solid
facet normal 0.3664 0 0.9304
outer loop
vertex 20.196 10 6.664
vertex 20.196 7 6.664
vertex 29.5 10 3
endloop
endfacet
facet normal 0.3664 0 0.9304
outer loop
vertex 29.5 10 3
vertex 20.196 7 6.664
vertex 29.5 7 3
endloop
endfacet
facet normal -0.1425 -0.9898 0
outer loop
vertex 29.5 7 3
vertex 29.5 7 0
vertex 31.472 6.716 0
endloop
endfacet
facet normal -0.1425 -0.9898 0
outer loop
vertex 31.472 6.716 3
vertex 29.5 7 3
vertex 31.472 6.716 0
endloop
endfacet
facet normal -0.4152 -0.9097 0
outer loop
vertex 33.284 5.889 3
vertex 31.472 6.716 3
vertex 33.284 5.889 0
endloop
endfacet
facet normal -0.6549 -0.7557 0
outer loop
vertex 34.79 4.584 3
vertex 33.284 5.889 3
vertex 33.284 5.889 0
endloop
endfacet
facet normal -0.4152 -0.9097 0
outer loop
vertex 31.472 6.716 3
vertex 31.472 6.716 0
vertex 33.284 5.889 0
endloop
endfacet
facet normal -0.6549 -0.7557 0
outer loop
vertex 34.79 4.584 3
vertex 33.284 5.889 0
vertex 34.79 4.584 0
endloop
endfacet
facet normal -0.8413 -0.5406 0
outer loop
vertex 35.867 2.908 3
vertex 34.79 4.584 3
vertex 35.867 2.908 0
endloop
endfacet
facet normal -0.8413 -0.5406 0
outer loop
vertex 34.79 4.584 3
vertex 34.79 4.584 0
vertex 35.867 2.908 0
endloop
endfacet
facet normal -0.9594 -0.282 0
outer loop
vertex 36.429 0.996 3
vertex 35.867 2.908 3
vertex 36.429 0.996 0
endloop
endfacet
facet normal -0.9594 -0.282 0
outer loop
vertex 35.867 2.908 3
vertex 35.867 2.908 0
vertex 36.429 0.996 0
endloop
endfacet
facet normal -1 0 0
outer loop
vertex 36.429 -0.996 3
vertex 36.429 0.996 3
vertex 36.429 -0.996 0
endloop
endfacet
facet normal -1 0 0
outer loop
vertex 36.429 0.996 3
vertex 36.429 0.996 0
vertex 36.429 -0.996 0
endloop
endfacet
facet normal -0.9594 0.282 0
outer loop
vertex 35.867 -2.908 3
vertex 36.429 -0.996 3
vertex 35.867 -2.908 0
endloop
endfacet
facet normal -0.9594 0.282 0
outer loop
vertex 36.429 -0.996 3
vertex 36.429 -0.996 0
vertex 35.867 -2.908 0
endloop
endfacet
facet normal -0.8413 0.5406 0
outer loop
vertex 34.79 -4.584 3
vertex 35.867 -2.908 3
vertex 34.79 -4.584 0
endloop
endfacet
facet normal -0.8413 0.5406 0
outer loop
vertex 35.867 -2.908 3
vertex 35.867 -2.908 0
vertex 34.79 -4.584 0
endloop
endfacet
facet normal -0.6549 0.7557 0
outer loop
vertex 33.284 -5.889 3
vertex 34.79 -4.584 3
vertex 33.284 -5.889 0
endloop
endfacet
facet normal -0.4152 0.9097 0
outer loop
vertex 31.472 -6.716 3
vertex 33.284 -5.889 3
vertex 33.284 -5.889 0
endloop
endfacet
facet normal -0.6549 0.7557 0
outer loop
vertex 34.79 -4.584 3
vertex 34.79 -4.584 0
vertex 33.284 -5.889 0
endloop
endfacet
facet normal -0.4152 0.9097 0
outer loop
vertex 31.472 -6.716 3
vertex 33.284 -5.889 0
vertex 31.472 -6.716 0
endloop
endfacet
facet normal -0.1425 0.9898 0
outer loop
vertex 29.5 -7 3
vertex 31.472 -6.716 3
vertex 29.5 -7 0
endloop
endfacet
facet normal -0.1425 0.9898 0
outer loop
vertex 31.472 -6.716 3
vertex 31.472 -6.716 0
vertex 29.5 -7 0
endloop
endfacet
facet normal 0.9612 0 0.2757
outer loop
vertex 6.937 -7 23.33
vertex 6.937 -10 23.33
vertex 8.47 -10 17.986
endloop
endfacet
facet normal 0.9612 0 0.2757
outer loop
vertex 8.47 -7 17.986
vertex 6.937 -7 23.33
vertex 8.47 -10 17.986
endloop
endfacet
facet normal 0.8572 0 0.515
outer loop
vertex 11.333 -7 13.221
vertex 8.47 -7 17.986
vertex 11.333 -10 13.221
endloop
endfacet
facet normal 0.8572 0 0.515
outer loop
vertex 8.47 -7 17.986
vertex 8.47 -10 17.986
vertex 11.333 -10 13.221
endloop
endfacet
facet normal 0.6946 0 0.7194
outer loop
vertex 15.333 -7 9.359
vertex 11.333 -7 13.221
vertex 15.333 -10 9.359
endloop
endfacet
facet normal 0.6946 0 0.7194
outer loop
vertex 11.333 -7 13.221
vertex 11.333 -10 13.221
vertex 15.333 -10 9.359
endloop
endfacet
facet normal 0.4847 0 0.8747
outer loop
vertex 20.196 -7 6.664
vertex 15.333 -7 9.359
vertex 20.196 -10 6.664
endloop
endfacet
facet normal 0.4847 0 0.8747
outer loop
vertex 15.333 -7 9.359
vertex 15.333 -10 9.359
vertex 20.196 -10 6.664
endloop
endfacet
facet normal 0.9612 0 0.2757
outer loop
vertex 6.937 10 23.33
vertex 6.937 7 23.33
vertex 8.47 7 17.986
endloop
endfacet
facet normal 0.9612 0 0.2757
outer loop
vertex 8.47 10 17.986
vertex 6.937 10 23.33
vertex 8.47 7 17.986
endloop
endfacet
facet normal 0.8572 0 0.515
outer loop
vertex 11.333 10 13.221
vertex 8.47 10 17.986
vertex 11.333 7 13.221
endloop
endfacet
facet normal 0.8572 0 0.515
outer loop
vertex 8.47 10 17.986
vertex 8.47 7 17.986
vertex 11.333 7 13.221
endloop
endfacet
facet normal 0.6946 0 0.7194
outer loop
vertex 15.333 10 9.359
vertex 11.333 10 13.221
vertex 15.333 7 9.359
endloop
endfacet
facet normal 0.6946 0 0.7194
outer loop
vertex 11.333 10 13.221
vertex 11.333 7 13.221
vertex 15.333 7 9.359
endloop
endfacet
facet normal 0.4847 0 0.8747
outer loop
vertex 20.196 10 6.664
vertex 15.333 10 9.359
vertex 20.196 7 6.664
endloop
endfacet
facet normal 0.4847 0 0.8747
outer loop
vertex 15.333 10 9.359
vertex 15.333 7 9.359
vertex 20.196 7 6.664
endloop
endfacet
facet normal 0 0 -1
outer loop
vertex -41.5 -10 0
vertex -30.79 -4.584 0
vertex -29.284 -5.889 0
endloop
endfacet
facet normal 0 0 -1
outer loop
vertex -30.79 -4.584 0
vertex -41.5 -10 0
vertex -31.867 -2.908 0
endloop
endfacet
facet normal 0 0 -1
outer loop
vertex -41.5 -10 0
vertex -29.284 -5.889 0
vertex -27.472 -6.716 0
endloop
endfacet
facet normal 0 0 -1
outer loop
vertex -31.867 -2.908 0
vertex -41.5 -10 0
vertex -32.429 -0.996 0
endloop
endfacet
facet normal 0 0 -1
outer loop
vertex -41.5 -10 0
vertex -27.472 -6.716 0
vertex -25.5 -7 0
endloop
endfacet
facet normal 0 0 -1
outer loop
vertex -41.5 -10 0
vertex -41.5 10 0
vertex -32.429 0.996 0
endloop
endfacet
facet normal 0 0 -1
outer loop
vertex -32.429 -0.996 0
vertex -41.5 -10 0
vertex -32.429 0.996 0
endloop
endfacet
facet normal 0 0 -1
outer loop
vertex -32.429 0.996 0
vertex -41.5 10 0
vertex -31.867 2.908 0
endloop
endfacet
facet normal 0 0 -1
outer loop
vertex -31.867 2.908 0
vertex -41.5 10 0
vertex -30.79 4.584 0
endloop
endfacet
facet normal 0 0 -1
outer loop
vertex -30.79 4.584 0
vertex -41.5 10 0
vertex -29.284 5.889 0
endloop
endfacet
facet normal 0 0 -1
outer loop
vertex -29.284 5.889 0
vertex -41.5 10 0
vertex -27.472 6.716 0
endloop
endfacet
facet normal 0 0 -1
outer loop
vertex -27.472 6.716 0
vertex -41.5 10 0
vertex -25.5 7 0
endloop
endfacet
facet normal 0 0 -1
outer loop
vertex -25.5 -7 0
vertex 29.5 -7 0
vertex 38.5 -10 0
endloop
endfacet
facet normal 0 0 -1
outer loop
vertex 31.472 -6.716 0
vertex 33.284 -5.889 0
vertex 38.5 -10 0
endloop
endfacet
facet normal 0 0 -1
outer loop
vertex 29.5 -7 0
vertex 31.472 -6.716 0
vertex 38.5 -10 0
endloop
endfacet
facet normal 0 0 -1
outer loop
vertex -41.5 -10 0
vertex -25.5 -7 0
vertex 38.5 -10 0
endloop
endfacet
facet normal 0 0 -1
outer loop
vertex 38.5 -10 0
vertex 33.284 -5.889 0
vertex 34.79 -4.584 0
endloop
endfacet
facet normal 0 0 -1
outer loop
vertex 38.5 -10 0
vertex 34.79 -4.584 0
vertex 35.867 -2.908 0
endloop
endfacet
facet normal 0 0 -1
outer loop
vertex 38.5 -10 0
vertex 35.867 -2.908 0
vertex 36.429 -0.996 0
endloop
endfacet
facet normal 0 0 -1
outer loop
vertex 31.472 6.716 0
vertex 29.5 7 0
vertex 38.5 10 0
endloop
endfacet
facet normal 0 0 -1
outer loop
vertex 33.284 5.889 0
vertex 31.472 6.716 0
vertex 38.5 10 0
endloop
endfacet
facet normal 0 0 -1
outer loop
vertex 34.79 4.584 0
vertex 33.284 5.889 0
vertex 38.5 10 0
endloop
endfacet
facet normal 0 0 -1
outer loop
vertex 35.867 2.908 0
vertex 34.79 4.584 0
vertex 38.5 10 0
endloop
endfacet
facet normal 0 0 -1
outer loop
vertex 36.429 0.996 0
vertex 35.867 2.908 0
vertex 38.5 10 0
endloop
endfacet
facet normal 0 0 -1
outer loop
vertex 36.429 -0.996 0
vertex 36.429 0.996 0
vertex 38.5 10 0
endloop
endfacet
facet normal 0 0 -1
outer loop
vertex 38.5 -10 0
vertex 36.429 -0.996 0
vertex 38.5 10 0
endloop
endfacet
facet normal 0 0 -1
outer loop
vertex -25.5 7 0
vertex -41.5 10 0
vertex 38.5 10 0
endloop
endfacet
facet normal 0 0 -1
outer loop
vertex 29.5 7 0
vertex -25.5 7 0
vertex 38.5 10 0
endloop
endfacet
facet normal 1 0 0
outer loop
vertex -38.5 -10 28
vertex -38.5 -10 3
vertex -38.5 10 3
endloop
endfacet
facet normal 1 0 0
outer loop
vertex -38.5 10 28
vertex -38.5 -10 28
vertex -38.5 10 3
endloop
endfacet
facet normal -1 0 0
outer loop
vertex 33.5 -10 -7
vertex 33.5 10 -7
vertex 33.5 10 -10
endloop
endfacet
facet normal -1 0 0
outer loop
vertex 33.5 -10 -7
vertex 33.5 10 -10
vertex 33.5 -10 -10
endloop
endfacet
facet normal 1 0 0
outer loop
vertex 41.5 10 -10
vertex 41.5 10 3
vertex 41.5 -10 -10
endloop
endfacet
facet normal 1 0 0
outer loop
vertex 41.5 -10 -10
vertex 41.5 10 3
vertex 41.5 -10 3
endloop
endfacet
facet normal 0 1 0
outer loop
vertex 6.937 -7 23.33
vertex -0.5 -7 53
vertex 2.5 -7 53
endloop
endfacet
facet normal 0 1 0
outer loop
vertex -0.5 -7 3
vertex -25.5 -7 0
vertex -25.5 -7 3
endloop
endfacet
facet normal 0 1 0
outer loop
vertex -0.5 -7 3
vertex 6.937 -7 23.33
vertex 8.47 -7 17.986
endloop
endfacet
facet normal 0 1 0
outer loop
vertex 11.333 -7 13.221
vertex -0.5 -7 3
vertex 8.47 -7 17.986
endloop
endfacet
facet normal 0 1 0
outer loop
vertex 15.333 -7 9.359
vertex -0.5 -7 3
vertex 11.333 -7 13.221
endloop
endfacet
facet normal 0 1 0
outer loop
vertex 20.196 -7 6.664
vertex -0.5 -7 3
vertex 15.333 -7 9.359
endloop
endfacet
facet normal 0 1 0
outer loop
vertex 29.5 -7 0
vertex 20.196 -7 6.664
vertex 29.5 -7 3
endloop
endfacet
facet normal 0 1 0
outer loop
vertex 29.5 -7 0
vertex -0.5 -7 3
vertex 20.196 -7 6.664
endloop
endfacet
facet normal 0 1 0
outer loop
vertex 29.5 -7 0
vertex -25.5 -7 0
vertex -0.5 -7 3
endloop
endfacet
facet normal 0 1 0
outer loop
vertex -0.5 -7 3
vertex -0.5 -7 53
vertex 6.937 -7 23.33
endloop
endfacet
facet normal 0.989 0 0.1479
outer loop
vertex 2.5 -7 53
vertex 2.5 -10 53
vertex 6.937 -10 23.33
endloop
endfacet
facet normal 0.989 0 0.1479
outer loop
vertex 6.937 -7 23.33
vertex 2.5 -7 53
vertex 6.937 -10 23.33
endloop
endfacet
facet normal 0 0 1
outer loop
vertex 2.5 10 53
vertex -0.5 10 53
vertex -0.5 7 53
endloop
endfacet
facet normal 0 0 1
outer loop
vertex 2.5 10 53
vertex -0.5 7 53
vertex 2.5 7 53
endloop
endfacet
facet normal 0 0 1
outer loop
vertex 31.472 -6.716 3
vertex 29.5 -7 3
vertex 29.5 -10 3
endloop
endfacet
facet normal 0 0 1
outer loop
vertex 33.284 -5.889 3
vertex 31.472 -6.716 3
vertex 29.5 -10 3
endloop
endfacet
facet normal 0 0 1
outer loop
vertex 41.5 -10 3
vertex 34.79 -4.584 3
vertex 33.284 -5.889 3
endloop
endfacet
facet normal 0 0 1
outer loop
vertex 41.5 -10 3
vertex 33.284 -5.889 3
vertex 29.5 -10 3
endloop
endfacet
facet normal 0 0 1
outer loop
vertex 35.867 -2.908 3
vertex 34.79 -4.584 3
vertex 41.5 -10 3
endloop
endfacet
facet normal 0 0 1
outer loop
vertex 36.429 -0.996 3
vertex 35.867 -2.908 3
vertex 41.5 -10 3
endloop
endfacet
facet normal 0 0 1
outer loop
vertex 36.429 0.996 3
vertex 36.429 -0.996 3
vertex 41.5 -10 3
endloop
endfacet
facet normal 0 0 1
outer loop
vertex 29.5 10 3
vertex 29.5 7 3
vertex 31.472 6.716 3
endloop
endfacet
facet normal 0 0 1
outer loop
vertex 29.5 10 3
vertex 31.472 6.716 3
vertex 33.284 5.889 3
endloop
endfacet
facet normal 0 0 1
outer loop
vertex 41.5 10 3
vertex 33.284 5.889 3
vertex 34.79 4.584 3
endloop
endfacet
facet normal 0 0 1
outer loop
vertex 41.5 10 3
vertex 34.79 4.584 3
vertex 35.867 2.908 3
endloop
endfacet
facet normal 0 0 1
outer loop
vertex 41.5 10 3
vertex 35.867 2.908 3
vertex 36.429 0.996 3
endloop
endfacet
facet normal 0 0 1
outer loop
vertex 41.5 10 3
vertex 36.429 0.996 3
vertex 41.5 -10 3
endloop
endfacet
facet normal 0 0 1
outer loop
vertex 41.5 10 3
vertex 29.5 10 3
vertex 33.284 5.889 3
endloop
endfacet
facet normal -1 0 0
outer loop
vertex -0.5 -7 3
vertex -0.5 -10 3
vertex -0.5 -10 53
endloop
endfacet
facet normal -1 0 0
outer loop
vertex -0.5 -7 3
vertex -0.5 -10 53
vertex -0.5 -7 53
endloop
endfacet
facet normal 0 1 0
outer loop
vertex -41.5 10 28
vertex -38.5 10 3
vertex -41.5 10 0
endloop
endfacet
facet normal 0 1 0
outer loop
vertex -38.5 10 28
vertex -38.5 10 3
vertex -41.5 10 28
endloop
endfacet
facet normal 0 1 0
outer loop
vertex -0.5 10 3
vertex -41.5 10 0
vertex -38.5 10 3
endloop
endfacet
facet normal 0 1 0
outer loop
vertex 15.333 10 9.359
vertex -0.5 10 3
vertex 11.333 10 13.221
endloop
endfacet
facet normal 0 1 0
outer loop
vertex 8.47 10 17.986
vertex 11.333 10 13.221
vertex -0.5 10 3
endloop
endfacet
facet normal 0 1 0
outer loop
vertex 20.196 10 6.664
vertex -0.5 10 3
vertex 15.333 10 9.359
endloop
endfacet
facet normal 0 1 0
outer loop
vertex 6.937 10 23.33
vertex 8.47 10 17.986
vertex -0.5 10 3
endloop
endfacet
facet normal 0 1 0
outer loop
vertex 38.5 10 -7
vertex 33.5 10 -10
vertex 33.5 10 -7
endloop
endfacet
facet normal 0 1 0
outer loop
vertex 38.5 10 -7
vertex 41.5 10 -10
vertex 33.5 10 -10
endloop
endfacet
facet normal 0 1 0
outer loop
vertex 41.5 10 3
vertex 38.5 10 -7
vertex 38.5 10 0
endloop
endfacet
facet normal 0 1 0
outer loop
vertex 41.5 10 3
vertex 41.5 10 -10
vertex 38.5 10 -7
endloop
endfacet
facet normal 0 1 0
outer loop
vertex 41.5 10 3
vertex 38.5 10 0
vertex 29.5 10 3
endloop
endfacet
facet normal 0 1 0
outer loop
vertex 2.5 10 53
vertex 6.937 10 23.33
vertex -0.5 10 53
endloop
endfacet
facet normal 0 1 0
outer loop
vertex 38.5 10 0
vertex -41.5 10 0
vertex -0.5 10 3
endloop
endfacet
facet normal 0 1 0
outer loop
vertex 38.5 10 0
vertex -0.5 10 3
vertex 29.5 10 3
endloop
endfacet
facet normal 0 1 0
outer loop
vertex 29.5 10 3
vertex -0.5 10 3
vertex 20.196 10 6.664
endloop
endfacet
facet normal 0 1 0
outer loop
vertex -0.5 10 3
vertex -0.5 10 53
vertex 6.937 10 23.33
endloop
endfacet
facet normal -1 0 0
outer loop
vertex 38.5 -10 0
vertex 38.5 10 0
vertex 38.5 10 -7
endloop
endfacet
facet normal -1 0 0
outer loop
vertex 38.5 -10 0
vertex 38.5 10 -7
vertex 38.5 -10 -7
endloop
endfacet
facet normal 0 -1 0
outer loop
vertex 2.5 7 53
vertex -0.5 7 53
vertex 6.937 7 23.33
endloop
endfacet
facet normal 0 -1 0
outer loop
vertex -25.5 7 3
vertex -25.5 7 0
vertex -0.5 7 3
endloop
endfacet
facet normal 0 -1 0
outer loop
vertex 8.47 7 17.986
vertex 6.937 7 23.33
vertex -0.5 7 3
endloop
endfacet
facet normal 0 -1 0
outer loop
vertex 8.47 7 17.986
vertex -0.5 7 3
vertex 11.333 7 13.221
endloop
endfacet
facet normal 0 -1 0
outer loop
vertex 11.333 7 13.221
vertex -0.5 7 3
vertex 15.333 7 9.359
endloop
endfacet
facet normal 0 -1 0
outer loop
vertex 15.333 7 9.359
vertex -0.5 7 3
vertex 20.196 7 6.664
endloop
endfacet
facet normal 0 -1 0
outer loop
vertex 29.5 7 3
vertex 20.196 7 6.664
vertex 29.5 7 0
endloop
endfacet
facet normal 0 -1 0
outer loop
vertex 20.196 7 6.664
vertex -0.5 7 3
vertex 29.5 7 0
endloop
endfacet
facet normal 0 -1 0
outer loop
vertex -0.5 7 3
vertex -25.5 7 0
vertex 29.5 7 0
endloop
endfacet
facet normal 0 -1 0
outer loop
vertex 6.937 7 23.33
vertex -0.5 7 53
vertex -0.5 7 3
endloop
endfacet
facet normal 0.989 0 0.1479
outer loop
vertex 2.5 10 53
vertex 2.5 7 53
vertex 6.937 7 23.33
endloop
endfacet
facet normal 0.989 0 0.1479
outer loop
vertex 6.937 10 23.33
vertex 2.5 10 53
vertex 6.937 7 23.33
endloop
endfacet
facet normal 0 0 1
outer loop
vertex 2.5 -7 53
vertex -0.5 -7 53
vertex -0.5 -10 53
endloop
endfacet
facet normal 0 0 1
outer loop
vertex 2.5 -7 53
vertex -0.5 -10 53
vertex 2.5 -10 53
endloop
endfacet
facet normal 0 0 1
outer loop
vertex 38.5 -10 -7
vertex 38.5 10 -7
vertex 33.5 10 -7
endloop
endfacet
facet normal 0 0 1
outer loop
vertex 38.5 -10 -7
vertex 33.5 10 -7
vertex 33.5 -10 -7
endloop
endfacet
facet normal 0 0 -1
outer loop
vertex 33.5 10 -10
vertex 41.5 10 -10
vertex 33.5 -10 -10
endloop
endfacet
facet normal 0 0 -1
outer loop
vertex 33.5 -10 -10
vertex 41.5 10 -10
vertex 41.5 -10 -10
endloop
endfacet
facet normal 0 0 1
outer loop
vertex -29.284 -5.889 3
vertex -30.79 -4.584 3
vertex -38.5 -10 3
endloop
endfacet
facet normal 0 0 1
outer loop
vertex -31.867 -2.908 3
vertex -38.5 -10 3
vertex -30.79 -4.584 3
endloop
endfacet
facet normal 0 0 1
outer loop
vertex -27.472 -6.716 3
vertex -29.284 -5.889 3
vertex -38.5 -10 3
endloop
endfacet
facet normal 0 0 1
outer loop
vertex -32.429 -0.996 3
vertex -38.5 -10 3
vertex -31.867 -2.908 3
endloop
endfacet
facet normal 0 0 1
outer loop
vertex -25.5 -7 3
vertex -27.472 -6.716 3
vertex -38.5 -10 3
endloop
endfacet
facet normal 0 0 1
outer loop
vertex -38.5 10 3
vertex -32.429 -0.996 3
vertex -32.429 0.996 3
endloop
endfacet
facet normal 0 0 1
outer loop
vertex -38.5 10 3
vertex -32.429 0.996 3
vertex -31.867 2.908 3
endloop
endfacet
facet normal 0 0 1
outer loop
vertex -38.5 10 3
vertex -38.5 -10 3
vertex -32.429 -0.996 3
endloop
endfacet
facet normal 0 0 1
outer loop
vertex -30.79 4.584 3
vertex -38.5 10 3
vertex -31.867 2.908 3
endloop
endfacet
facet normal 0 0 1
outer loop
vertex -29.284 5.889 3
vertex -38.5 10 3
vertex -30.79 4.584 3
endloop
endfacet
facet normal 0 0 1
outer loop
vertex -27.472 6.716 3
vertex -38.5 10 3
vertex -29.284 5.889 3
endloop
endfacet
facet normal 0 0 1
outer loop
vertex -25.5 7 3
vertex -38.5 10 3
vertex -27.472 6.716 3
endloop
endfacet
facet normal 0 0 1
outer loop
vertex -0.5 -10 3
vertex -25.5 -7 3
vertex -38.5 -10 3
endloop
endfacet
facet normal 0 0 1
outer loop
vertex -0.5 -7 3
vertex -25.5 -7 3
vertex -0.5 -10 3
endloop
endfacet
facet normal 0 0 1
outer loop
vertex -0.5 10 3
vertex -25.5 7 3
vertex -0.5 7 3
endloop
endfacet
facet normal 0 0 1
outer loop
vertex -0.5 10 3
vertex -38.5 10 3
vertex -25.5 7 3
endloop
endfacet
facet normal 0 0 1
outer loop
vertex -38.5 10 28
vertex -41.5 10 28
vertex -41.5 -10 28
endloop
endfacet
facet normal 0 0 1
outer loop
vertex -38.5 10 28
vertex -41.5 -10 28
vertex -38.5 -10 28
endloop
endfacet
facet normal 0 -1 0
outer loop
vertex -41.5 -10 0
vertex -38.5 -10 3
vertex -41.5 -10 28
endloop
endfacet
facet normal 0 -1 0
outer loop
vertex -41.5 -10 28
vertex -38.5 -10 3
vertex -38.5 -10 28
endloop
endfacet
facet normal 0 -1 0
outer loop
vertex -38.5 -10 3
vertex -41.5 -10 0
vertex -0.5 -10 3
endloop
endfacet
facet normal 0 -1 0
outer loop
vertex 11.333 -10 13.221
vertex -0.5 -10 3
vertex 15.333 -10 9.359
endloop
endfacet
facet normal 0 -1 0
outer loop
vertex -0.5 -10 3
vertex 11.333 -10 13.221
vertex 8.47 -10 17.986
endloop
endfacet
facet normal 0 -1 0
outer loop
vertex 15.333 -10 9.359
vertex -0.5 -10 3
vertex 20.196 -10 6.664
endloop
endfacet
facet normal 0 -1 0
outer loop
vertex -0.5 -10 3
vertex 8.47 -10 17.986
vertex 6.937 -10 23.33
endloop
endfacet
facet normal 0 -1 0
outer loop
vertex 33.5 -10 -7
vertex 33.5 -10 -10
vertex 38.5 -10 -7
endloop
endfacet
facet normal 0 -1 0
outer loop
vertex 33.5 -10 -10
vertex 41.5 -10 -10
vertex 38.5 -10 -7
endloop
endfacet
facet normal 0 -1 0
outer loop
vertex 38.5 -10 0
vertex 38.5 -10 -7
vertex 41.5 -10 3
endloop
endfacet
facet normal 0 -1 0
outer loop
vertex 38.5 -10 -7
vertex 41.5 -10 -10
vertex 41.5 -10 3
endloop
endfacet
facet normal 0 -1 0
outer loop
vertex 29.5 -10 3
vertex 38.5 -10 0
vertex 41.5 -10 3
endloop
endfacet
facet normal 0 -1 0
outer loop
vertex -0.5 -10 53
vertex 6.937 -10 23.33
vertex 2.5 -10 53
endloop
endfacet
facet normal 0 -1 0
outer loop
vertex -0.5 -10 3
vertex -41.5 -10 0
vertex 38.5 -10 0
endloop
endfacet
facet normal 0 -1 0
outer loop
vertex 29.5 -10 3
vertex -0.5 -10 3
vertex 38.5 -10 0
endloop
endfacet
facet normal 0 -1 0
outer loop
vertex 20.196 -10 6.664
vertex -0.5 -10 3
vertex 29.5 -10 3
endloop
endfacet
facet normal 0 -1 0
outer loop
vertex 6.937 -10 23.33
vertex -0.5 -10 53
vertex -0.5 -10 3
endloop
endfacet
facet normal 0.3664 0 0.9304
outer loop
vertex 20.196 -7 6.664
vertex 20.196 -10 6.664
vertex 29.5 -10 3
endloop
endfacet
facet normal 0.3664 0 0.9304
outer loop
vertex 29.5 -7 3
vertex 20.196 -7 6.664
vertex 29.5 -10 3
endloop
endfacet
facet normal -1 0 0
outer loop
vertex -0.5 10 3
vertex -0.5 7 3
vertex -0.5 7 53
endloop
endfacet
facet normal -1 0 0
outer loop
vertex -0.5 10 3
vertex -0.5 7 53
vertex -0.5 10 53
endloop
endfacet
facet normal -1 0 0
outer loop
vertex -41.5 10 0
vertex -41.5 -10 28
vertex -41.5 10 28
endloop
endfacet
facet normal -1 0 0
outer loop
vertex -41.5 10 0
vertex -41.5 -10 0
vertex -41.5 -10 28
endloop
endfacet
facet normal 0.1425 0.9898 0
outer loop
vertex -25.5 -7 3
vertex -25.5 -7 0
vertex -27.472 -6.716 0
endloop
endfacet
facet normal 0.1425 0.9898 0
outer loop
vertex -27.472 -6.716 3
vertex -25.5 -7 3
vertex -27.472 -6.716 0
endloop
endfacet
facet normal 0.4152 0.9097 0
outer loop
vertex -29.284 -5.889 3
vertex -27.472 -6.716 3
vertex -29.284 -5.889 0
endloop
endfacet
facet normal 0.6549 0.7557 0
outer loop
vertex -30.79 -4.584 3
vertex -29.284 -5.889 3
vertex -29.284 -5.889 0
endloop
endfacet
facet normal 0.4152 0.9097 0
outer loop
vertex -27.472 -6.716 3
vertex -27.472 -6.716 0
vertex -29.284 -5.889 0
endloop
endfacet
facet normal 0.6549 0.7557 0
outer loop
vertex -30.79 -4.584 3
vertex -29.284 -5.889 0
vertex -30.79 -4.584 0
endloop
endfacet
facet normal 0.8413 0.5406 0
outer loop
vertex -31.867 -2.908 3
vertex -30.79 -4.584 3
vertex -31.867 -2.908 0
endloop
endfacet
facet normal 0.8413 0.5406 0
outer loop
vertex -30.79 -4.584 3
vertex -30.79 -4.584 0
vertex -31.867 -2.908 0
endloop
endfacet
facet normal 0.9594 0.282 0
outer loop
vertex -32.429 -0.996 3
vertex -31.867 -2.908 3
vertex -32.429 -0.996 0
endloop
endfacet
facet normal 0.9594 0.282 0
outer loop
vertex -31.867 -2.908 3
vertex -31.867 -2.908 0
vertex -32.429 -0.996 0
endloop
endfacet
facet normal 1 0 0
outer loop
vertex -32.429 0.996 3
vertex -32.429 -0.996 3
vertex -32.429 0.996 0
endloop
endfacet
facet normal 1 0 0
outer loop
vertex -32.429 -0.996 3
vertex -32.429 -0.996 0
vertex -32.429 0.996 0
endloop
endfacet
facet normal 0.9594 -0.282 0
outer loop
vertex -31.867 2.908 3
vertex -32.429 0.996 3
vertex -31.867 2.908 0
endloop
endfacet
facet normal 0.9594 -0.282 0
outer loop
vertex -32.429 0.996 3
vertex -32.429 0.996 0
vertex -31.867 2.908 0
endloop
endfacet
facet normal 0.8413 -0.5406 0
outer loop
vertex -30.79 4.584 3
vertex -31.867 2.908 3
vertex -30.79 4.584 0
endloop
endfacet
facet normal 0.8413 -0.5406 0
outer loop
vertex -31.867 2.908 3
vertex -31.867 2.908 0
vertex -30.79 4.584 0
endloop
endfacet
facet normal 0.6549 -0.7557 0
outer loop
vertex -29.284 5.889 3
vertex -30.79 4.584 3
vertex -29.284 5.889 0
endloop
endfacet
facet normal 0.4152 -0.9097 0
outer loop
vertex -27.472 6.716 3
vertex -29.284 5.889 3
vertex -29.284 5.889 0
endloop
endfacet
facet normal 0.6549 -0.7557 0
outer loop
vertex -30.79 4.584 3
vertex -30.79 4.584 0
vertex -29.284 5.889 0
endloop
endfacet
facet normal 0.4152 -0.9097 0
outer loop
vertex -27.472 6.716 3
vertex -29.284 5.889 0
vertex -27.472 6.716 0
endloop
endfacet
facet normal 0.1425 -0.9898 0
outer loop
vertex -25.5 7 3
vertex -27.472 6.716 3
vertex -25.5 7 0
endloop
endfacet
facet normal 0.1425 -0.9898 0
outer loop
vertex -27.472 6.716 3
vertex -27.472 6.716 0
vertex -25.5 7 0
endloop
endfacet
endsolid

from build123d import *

# Parameters (mm, degrees)
SKETCH_W        = 83
SKETCH_H        = 20
PAD_DEPTH       = 3
SKETCH001_W     = 3
SKETCH001_H     = 20
PAD001_DEPTH    = 25
SKETCH002_W     = 30
SKETCH002_H     = 20
PAD002_DEPTH    = 50
POCKET_DEPTH    = 20.001
POCKET001_DEPTH = 53.001
SKETCH006_W     = 3
SKETCH006_H     = 20
PAD003_DEPTH    = 10
SKETCH007_W     = 20
SKETCH007_H     = 3
PAD004_DEPTH    = 5


with BuildPart() as part:
    # Sketch → Pad (new body)
    with BuildSketch(Plane.XY):
        Rectangle(SKETCH_W, SKETCH_H)
    extrude(amount=PAD_DEPTH)

    # Sketch001 → Pad001 (new body)
    with BuildSketch(Plane.XY.offset(3)):
        with Locations((-40, 0)):
            Rectangle(SKETCH001_W, SKETCH001_H)
    extrude(amount=PAD001_DEPTH)

    # Sketch002 → Pad002 (new body)
    with BuildSketch(Plane.XY.offset(3)):
        with Locations((14.5, 0)):
            Rectangle(SKETCH002_W, SKETCH002_H)
    extrude(amount=PAD002_DEPTH)

    # Sketch004 → Pocket (cut, through all)
    with BuildSketch(Plane.XZ.offset(10)):
        with BuildLine():
            Line((2.5, 53), (6.936769, 23.329896))
            ThreePointArc((6.936769, 23.329896), (11.333368, 13.220729), (20.195517, 6.664232))
            Line((20.195517, 6.664232), (29.5, 3))
            Line((63.265705, 66.309877), (29.5, 3))
            Line((2.5, 53), (63.265705, 66.309877))
        make_face()
    extrude(amount=-POCKET_DEPTH, mode=Mode.SUBTRACT)

    # Sketch005 → Pocket001 (cut, through all)
    with BuildSketch(Plane(origin=(0, 0, 0), x_dir=(1, 0, 0), z_dir=(0, 0, -1))):
        with BuildLine():
            ThreePointArc((-25.5, 7), (-32.5, 0), (-25.5, -7))
            Line((-25.5, -7), (29.5, -7))
            ThreePointArc((29.5, -7), (36.5, 0), (29.5, 7))
            Line((-25.5, 7), (29.5, 7))
        make_face()
    extrude(amount=-POCKET001_DEPTH, mode=Mode.SUBTRACT)

    # Sketch006 → Pad003 (new body)
    with BuildSketch(Plane(origin=(0, 0, 0), x_dir=(1, 0, 0), z_dir=(0, 0, -1))):
        with Locations((40, 0)):
            Rectangle(SKETCH006_W, SKETCH006_H)
    extrude(amount=PAD003_DEPTH)

    # Sketch007 → Pad004 (new body)
    with BuildSketch(Plane(origin=(38.5, 0, 0), x_dir=(0, -1, 0), z_dir=(-1, 0, 0))):
        with Locations((0, -8.5)):
            Rectangle(SKETCH007_W, SKETCH007_H)
    extrude(amount=PAD004_DEPTH)


solid = part.part
